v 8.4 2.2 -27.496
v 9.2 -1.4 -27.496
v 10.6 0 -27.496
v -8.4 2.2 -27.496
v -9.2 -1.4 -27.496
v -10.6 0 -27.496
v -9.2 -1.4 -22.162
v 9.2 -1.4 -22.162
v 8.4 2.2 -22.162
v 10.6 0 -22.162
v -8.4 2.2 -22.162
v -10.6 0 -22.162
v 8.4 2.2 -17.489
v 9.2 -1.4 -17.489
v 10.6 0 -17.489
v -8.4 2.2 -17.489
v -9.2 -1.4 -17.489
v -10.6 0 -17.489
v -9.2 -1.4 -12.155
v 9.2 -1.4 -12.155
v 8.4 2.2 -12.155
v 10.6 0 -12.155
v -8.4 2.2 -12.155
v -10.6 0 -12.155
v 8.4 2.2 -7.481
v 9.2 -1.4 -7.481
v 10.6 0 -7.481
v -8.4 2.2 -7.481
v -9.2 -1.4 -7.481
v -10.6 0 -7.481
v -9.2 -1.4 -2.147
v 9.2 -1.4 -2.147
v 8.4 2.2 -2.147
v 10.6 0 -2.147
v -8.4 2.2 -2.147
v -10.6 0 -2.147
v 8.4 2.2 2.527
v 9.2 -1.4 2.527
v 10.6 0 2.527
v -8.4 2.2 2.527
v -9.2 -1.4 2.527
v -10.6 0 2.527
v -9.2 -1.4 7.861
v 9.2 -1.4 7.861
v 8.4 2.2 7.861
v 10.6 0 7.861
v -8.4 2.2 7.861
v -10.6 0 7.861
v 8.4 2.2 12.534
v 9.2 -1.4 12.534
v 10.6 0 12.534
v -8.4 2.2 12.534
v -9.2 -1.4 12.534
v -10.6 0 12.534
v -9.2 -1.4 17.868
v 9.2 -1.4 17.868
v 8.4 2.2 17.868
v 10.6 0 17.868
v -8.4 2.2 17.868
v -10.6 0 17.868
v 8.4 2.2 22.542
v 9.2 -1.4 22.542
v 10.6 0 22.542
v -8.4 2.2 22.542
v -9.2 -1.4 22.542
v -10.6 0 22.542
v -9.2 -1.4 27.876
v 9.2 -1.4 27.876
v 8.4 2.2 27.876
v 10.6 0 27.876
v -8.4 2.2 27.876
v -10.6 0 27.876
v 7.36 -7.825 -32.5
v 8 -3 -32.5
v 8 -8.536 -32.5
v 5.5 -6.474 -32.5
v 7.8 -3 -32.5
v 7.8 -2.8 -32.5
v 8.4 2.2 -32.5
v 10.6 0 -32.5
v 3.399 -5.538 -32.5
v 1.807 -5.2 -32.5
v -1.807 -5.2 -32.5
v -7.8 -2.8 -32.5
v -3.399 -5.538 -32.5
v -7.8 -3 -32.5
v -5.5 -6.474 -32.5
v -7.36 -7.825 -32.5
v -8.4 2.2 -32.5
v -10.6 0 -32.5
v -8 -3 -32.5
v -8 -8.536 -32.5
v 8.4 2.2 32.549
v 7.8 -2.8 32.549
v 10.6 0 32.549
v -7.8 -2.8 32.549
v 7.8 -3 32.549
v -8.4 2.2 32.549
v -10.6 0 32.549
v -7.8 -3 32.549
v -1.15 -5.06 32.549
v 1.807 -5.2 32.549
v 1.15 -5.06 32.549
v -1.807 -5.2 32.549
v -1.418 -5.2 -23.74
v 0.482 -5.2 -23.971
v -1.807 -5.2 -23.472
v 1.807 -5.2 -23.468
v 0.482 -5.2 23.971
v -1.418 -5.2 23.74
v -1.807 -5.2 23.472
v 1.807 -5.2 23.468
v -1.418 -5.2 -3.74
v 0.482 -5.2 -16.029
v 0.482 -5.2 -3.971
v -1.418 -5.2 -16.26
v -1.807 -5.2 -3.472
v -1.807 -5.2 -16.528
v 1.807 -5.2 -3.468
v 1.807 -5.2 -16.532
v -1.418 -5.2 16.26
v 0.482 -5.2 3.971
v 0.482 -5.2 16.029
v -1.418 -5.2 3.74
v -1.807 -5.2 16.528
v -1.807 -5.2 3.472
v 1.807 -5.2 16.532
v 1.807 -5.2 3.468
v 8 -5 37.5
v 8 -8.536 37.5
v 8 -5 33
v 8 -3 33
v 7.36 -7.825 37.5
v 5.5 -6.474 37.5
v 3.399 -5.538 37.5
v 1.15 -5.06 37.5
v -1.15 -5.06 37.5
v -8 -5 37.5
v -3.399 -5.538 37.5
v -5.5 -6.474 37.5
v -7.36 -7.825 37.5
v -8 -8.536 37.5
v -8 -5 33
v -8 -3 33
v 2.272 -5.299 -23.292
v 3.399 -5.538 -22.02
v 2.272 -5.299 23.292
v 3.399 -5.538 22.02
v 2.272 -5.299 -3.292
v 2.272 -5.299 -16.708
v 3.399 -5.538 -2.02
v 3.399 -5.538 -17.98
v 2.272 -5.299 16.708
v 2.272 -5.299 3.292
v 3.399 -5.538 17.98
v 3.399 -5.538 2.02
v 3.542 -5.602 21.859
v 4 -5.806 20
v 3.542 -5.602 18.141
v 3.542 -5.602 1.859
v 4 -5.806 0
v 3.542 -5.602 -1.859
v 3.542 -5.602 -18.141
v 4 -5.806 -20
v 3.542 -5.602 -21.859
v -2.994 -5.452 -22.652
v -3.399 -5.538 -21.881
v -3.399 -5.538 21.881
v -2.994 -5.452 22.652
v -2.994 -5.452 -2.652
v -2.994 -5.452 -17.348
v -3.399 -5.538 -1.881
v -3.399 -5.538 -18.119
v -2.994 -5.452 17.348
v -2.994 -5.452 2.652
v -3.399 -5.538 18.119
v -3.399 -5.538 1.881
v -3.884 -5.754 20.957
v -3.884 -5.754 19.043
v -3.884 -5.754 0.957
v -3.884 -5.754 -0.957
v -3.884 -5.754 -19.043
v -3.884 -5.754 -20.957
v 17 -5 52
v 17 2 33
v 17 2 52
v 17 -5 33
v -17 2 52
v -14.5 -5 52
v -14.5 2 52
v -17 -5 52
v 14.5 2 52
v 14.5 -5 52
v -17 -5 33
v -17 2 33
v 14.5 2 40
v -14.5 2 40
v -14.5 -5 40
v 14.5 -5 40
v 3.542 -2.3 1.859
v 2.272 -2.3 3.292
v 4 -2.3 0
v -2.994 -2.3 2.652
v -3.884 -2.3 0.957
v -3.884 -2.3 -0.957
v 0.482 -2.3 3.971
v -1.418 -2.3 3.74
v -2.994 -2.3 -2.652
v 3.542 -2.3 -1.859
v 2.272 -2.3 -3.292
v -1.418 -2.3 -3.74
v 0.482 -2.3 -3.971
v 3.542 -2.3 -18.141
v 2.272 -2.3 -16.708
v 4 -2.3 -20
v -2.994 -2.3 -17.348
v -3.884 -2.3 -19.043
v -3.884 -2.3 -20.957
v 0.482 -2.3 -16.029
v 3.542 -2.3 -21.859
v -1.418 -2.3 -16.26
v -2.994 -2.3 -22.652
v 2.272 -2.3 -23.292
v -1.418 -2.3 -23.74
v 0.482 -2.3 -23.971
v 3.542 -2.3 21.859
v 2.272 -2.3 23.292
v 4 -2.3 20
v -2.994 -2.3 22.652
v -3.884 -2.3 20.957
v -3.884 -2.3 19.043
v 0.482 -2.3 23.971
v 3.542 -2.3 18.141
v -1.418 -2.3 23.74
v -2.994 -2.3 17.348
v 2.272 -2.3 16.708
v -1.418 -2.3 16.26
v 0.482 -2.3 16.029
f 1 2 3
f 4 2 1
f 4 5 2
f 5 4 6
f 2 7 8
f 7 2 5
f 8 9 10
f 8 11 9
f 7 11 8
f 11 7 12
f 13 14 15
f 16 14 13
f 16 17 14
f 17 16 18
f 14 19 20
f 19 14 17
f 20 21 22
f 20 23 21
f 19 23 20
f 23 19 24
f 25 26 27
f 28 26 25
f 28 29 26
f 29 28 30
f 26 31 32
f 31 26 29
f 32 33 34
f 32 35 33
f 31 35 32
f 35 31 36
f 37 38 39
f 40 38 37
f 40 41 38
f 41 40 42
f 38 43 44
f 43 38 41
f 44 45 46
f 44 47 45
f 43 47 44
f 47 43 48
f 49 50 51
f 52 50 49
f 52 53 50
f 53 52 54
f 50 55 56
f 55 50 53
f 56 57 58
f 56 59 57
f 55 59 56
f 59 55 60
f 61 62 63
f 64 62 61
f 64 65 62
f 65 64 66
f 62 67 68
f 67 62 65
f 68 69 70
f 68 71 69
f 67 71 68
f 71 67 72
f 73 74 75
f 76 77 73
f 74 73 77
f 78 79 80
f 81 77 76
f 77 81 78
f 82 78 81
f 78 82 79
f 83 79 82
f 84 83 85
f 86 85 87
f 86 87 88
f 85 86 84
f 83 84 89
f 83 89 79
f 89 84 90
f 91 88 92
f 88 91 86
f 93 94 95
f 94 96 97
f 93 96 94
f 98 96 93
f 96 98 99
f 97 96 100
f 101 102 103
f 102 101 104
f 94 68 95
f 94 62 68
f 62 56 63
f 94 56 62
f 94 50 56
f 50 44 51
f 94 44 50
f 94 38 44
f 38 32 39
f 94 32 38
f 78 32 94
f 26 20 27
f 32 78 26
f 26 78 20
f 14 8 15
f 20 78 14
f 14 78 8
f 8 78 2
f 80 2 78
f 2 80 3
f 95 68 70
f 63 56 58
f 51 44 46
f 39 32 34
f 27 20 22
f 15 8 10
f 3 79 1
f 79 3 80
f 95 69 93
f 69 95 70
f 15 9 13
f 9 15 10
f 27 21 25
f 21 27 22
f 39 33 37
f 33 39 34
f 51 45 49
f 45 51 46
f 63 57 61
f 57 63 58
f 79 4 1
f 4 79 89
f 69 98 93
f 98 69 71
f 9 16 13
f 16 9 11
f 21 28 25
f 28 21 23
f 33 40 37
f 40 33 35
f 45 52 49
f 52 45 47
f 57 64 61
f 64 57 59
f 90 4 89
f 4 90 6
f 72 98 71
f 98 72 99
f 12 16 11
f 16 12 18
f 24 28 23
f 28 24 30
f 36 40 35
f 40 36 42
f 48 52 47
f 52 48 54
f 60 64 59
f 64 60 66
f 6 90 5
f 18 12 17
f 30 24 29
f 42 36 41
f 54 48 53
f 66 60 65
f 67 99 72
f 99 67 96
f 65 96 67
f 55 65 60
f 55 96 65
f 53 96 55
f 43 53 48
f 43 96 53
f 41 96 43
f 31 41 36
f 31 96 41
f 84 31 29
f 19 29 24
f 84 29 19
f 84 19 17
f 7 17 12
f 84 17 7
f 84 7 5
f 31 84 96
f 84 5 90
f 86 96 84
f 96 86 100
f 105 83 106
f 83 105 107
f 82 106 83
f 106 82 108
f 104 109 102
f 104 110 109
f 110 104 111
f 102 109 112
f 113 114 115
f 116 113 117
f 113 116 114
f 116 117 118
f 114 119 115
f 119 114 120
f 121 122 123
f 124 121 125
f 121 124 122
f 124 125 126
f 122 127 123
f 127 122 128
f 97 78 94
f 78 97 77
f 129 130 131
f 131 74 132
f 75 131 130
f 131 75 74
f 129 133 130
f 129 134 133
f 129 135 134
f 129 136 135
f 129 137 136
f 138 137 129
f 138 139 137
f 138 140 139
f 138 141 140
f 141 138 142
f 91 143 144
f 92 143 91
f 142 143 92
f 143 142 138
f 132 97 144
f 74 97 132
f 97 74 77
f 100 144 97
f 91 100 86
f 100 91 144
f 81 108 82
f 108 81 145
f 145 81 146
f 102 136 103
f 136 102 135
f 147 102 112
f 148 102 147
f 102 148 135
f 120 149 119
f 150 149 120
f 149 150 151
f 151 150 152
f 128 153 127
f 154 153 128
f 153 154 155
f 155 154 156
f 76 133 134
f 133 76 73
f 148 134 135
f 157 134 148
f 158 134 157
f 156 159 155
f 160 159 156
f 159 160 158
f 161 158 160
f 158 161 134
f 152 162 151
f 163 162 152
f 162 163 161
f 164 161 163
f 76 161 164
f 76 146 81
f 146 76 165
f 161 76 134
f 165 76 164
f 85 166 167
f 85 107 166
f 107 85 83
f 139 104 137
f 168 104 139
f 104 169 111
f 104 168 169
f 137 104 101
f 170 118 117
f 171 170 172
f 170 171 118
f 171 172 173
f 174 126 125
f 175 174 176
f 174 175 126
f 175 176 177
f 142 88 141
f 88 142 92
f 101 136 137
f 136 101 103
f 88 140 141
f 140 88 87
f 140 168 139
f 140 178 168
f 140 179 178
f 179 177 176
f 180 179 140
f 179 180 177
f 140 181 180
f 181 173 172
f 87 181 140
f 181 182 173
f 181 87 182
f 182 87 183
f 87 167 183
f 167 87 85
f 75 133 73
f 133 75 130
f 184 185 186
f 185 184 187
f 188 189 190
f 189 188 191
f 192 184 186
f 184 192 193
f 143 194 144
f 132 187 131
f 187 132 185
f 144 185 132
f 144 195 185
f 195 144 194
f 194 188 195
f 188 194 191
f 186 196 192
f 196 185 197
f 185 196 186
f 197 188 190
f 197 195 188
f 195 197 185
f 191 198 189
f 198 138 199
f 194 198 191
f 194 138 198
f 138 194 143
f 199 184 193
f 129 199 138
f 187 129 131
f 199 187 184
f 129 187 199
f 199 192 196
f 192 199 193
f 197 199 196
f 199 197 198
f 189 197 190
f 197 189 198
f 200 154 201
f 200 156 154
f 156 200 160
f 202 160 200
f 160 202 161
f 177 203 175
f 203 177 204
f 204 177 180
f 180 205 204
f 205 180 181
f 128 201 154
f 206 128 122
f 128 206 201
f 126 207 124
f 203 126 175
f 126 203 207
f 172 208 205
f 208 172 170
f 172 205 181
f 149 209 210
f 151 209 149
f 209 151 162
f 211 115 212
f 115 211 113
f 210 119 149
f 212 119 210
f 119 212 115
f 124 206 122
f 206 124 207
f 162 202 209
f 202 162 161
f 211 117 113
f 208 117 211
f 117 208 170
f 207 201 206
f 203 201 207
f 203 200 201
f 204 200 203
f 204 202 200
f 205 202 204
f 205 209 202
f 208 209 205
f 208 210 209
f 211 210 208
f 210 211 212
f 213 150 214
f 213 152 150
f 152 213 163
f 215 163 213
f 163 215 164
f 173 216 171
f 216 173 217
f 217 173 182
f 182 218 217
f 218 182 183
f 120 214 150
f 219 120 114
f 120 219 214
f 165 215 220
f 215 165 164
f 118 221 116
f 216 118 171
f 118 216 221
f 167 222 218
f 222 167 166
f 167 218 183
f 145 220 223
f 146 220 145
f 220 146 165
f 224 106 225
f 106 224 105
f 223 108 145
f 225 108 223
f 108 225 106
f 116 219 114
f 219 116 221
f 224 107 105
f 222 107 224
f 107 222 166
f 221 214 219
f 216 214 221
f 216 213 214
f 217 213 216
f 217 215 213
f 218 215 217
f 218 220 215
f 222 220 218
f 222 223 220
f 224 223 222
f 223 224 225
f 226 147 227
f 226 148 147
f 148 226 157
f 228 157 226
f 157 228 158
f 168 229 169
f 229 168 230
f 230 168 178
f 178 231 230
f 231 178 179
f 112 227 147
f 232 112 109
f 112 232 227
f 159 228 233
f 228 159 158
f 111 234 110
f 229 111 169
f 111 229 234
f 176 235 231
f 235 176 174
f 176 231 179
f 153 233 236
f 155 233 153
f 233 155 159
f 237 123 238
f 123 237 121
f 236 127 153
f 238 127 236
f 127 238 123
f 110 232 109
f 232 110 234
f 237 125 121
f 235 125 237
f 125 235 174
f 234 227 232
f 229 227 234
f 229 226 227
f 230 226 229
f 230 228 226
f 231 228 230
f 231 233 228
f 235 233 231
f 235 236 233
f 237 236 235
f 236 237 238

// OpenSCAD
/*
 This was originally:

 Picatinny rail for G36 airsoft gun
 By Stuart Livings, Matthew Roberts. (C) 2010

 This work is free software; you can redistribute it and/or modify it under
 the terms of the GNU General Public License as published by the Free Software
 Foundation; version 2.

 This work is distributed in the hope that it will be useful, but WITHOUT ANY
 WARRANTY; without even the implied warranty of MERCHANTABILITY or FITNESS FOR
 A PARTICULAR PURPOSE. See the version 2 of the GNU General Public License for
 more details.


Only the spacing has been tweaked. The center-to-center distance between gaps
in the rail should be 0.394 inches, or 10.0076 mm. The gap itself should be
0.206 inches; with a tolerance of -0.000" +0.008". To ensure any ridges from
printing don't try and make that go negative, I've set the gap to be 0.210 inches.
 */
difference(){
union(){
rail(6);
translate([-8,-14,-32.5]){
    difference(){
        cube([16,11,70]);
        translate([8,-2,0]){
            cylinder(d=22, h=80);
        }
    }
}
difference(){
translate([-17,-5,33]){
    cube([34,7,19]);
}
translate([-14.5,-9,40]){
    cube([29,17,19]);
}}}

translate([0,-2.3,0]){
    rotate([90,0,0]){
        cylinder(h=4,d=8);
    }
}

translate([0,-2.3,-20]){
    rotate([90,0,0]){
        cylinder(h=4,d=8);
    }
}

translate([0,-2.3,20]){
    rotate([90,0,0]){
        cylinder(h=4,d=8);
    }
}
}




module rail(sections) {
	translate(v = [0, 0, -5 * sections - 2.5])
        difference() {
		linear_extrude(height = (10.0076 * (0.5 + sections)))
               railprofile();
            translate([0,-0.6,0])
		union() {
			for (s = [1:sections]) {
				translate(v = [0, 0, s * 10.0076 - 10.0076/2.0])
             linear_extrude(height = 5.334)
                             cutprofile();
			}
		}
	  }
}

module railprofile() {
extra_height = 1.4;
	polygon(points=[[-10.6,0],[-8.4,2.2],[8.4,2.2],[10.6,0],[7.8,-2.8],[7.8,-3.8-extra_height],[-7.8,-3.8-extra_height],[-7.8,-2.8]], paths=[[0,1,2,3,4,5,6,7,0]]);
}

module cutprofile() {
	polygon(points=[[-12, -0.8], [-12, 3], [12, 3], [12, -0.8]], paths=[[0,1,2,3,0]]);
}
